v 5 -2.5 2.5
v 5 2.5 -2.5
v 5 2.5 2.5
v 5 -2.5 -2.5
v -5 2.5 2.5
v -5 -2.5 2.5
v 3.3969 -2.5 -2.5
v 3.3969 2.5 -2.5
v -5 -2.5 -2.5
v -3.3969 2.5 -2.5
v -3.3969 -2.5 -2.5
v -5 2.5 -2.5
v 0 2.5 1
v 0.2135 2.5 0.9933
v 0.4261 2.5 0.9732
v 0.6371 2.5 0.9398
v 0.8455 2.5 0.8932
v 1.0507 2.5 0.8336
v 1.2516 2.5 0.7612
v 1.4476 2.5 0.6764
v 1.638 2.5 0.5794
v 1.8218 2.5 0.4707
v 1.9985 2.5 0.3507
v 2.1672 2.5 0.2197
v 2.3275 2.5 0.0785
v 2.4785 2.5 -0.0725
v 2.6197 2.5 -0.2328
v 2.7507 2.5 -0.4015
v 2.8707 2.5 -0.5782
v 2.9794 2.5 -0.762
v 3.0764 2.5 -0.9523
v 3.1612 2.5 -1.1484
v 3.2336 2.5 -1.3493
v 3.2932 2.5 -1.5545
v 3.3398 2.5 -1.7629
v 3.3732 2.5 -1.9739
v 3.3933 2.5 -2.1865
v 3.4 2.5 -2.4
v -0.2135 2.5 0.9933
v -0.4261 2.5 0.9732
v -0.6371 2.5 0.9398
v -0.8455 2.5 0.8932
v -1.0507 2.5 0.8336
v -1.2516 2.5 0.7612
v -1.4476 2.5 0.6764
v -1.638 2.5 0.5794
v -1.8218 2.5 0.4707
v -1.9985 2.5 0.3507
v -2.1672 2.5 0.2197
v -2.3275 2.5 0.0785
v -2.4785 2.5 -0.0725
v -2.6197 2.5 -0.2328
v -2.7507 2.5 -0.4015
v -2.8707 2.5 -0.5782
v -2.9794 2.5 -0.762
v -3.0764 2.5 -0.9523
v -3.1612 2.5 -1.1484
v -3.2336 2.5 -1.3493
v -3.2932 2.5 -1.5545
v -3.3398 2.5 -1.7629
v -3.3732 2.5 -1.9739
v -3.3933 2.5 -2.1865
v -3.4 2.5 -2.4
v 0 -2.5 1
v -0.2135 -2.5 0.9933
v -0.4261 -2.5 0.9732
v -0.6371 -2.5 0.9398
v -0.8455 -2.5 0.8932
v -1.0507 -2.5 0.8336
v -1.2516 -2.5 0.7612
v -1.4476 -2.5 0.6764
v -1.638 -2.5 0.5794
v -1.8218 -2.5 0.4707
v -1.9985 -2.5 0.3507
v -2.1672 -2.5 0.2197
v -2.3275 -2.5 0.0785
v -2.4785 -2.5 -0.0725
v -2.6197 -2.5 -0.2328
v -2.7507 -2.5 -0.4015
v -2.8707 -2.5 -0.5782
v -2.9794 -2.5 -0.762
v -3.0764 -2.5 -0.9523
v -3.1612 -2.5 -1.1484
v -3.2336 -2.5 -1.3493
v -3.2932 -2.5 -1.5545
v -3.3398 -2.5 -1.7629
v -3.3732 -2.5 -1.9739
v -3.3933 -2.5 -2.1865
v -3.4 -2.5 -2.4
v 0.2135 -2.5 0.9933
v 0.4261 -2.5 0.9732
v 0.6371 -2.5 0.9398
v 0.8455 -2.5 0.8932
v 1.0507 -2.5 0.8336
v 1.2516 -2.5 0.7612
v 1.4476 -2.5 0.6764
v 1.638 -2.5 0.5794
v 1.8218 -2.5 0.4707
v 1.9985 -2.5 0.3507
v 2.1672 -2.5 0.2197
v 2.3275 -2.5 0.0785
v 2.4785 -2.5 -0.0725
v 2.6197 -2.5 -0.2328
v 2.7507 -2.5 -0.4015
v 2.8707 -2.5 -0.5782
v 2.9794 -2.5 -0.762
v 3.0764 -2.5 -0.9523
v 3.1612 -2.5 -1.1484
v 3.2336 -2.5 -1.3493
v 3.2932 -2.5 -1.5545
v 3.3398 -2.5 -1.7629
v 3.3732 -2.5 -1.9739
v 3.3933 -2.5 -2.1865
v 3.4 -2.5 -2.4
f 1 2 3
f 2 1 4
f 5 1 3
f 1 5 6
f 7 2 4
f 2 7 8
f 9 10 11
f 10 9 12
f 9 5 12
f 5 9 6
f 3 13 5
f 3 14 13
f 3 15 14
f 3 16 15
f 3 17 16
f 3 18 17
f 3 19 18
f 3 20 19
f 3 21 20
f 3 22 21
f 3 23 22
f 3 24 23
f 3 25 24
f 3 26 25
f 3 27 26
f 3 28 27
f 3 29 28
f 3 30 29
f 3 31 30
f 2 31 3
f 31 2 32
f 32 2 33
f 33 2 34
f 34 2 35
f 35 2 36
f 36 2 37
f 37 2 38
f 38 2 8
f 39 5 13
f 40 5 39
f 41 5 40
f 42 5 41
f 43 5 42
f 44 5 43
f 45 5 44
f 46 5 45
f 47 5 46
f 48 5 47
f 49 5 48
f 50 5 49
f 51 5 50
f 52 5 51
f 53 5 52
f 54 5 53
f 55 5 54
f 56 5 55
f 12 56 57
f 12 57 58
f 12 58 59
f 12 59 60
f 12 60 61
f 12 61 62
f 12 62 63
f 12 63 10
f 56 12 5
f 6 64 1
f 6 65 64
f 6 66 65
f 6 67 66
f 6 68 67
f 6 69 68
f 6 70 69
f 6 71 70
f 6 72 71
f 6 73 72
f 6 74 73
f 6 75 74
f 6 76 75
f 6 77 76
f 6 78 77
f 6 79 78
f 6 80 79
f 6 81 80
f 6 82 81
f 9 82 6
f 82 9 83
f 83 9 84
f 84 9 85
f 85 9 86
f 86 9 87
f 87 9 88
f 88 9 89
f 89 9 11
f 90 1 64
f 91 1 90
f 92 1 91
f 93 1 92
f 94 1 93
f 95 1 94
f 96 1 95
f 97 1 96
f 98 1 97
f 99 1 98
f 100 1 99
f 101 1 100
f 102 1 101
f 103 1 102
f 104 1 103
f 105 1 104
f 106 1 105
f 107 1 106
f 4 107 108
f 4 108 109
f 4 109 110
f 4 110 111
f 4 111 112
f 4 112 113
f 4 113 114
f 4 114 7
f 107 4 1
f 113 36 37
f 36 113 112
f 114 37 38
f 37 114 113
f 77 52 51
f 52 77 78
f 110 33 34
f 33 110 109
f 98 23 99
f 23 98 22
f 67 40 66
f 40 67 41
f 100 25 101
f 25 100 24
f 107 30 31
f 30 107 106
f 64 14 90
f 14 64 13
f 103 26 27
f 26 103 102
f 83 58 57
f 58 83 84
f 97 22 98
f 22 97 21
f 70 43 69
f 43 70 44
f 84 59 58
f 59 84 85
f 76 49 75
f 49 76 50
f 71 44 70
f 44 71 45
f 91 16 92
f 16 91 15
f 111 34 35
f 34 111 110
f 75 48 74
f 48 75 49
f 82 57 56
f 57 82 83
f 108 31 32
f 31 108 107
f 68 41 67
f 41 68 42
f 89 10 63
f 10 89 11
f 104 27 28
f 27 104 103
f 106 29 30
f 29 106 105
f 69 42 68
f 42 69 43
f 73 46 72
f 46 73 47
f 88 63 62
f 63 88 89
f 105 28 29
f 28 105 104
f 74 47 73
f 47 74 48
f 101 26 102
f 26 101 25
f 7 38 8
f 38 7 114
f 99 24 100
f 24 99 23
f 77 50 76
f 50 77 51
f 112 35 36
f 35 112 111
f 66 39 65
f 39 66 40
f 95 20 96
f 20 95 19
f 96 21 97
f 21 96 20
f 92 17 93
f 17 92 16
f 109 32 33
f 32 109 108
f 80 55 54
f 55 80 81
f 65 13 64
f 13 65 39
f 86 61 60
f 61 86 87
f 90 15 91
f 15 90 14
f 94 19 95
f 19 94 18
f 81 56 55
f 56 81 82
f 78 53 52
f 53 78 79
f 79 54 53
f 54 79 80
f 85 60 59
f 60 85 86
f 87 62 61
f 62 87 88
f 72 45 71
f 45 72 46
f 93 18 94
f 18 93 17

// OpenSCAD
$fn = 100;
difference() {
    cube([10,5,5], center=true);
    rotate([90,0,0]) translate([0,-2.40,0]) cylinder(10,3.40,3.40, center=true);
}
